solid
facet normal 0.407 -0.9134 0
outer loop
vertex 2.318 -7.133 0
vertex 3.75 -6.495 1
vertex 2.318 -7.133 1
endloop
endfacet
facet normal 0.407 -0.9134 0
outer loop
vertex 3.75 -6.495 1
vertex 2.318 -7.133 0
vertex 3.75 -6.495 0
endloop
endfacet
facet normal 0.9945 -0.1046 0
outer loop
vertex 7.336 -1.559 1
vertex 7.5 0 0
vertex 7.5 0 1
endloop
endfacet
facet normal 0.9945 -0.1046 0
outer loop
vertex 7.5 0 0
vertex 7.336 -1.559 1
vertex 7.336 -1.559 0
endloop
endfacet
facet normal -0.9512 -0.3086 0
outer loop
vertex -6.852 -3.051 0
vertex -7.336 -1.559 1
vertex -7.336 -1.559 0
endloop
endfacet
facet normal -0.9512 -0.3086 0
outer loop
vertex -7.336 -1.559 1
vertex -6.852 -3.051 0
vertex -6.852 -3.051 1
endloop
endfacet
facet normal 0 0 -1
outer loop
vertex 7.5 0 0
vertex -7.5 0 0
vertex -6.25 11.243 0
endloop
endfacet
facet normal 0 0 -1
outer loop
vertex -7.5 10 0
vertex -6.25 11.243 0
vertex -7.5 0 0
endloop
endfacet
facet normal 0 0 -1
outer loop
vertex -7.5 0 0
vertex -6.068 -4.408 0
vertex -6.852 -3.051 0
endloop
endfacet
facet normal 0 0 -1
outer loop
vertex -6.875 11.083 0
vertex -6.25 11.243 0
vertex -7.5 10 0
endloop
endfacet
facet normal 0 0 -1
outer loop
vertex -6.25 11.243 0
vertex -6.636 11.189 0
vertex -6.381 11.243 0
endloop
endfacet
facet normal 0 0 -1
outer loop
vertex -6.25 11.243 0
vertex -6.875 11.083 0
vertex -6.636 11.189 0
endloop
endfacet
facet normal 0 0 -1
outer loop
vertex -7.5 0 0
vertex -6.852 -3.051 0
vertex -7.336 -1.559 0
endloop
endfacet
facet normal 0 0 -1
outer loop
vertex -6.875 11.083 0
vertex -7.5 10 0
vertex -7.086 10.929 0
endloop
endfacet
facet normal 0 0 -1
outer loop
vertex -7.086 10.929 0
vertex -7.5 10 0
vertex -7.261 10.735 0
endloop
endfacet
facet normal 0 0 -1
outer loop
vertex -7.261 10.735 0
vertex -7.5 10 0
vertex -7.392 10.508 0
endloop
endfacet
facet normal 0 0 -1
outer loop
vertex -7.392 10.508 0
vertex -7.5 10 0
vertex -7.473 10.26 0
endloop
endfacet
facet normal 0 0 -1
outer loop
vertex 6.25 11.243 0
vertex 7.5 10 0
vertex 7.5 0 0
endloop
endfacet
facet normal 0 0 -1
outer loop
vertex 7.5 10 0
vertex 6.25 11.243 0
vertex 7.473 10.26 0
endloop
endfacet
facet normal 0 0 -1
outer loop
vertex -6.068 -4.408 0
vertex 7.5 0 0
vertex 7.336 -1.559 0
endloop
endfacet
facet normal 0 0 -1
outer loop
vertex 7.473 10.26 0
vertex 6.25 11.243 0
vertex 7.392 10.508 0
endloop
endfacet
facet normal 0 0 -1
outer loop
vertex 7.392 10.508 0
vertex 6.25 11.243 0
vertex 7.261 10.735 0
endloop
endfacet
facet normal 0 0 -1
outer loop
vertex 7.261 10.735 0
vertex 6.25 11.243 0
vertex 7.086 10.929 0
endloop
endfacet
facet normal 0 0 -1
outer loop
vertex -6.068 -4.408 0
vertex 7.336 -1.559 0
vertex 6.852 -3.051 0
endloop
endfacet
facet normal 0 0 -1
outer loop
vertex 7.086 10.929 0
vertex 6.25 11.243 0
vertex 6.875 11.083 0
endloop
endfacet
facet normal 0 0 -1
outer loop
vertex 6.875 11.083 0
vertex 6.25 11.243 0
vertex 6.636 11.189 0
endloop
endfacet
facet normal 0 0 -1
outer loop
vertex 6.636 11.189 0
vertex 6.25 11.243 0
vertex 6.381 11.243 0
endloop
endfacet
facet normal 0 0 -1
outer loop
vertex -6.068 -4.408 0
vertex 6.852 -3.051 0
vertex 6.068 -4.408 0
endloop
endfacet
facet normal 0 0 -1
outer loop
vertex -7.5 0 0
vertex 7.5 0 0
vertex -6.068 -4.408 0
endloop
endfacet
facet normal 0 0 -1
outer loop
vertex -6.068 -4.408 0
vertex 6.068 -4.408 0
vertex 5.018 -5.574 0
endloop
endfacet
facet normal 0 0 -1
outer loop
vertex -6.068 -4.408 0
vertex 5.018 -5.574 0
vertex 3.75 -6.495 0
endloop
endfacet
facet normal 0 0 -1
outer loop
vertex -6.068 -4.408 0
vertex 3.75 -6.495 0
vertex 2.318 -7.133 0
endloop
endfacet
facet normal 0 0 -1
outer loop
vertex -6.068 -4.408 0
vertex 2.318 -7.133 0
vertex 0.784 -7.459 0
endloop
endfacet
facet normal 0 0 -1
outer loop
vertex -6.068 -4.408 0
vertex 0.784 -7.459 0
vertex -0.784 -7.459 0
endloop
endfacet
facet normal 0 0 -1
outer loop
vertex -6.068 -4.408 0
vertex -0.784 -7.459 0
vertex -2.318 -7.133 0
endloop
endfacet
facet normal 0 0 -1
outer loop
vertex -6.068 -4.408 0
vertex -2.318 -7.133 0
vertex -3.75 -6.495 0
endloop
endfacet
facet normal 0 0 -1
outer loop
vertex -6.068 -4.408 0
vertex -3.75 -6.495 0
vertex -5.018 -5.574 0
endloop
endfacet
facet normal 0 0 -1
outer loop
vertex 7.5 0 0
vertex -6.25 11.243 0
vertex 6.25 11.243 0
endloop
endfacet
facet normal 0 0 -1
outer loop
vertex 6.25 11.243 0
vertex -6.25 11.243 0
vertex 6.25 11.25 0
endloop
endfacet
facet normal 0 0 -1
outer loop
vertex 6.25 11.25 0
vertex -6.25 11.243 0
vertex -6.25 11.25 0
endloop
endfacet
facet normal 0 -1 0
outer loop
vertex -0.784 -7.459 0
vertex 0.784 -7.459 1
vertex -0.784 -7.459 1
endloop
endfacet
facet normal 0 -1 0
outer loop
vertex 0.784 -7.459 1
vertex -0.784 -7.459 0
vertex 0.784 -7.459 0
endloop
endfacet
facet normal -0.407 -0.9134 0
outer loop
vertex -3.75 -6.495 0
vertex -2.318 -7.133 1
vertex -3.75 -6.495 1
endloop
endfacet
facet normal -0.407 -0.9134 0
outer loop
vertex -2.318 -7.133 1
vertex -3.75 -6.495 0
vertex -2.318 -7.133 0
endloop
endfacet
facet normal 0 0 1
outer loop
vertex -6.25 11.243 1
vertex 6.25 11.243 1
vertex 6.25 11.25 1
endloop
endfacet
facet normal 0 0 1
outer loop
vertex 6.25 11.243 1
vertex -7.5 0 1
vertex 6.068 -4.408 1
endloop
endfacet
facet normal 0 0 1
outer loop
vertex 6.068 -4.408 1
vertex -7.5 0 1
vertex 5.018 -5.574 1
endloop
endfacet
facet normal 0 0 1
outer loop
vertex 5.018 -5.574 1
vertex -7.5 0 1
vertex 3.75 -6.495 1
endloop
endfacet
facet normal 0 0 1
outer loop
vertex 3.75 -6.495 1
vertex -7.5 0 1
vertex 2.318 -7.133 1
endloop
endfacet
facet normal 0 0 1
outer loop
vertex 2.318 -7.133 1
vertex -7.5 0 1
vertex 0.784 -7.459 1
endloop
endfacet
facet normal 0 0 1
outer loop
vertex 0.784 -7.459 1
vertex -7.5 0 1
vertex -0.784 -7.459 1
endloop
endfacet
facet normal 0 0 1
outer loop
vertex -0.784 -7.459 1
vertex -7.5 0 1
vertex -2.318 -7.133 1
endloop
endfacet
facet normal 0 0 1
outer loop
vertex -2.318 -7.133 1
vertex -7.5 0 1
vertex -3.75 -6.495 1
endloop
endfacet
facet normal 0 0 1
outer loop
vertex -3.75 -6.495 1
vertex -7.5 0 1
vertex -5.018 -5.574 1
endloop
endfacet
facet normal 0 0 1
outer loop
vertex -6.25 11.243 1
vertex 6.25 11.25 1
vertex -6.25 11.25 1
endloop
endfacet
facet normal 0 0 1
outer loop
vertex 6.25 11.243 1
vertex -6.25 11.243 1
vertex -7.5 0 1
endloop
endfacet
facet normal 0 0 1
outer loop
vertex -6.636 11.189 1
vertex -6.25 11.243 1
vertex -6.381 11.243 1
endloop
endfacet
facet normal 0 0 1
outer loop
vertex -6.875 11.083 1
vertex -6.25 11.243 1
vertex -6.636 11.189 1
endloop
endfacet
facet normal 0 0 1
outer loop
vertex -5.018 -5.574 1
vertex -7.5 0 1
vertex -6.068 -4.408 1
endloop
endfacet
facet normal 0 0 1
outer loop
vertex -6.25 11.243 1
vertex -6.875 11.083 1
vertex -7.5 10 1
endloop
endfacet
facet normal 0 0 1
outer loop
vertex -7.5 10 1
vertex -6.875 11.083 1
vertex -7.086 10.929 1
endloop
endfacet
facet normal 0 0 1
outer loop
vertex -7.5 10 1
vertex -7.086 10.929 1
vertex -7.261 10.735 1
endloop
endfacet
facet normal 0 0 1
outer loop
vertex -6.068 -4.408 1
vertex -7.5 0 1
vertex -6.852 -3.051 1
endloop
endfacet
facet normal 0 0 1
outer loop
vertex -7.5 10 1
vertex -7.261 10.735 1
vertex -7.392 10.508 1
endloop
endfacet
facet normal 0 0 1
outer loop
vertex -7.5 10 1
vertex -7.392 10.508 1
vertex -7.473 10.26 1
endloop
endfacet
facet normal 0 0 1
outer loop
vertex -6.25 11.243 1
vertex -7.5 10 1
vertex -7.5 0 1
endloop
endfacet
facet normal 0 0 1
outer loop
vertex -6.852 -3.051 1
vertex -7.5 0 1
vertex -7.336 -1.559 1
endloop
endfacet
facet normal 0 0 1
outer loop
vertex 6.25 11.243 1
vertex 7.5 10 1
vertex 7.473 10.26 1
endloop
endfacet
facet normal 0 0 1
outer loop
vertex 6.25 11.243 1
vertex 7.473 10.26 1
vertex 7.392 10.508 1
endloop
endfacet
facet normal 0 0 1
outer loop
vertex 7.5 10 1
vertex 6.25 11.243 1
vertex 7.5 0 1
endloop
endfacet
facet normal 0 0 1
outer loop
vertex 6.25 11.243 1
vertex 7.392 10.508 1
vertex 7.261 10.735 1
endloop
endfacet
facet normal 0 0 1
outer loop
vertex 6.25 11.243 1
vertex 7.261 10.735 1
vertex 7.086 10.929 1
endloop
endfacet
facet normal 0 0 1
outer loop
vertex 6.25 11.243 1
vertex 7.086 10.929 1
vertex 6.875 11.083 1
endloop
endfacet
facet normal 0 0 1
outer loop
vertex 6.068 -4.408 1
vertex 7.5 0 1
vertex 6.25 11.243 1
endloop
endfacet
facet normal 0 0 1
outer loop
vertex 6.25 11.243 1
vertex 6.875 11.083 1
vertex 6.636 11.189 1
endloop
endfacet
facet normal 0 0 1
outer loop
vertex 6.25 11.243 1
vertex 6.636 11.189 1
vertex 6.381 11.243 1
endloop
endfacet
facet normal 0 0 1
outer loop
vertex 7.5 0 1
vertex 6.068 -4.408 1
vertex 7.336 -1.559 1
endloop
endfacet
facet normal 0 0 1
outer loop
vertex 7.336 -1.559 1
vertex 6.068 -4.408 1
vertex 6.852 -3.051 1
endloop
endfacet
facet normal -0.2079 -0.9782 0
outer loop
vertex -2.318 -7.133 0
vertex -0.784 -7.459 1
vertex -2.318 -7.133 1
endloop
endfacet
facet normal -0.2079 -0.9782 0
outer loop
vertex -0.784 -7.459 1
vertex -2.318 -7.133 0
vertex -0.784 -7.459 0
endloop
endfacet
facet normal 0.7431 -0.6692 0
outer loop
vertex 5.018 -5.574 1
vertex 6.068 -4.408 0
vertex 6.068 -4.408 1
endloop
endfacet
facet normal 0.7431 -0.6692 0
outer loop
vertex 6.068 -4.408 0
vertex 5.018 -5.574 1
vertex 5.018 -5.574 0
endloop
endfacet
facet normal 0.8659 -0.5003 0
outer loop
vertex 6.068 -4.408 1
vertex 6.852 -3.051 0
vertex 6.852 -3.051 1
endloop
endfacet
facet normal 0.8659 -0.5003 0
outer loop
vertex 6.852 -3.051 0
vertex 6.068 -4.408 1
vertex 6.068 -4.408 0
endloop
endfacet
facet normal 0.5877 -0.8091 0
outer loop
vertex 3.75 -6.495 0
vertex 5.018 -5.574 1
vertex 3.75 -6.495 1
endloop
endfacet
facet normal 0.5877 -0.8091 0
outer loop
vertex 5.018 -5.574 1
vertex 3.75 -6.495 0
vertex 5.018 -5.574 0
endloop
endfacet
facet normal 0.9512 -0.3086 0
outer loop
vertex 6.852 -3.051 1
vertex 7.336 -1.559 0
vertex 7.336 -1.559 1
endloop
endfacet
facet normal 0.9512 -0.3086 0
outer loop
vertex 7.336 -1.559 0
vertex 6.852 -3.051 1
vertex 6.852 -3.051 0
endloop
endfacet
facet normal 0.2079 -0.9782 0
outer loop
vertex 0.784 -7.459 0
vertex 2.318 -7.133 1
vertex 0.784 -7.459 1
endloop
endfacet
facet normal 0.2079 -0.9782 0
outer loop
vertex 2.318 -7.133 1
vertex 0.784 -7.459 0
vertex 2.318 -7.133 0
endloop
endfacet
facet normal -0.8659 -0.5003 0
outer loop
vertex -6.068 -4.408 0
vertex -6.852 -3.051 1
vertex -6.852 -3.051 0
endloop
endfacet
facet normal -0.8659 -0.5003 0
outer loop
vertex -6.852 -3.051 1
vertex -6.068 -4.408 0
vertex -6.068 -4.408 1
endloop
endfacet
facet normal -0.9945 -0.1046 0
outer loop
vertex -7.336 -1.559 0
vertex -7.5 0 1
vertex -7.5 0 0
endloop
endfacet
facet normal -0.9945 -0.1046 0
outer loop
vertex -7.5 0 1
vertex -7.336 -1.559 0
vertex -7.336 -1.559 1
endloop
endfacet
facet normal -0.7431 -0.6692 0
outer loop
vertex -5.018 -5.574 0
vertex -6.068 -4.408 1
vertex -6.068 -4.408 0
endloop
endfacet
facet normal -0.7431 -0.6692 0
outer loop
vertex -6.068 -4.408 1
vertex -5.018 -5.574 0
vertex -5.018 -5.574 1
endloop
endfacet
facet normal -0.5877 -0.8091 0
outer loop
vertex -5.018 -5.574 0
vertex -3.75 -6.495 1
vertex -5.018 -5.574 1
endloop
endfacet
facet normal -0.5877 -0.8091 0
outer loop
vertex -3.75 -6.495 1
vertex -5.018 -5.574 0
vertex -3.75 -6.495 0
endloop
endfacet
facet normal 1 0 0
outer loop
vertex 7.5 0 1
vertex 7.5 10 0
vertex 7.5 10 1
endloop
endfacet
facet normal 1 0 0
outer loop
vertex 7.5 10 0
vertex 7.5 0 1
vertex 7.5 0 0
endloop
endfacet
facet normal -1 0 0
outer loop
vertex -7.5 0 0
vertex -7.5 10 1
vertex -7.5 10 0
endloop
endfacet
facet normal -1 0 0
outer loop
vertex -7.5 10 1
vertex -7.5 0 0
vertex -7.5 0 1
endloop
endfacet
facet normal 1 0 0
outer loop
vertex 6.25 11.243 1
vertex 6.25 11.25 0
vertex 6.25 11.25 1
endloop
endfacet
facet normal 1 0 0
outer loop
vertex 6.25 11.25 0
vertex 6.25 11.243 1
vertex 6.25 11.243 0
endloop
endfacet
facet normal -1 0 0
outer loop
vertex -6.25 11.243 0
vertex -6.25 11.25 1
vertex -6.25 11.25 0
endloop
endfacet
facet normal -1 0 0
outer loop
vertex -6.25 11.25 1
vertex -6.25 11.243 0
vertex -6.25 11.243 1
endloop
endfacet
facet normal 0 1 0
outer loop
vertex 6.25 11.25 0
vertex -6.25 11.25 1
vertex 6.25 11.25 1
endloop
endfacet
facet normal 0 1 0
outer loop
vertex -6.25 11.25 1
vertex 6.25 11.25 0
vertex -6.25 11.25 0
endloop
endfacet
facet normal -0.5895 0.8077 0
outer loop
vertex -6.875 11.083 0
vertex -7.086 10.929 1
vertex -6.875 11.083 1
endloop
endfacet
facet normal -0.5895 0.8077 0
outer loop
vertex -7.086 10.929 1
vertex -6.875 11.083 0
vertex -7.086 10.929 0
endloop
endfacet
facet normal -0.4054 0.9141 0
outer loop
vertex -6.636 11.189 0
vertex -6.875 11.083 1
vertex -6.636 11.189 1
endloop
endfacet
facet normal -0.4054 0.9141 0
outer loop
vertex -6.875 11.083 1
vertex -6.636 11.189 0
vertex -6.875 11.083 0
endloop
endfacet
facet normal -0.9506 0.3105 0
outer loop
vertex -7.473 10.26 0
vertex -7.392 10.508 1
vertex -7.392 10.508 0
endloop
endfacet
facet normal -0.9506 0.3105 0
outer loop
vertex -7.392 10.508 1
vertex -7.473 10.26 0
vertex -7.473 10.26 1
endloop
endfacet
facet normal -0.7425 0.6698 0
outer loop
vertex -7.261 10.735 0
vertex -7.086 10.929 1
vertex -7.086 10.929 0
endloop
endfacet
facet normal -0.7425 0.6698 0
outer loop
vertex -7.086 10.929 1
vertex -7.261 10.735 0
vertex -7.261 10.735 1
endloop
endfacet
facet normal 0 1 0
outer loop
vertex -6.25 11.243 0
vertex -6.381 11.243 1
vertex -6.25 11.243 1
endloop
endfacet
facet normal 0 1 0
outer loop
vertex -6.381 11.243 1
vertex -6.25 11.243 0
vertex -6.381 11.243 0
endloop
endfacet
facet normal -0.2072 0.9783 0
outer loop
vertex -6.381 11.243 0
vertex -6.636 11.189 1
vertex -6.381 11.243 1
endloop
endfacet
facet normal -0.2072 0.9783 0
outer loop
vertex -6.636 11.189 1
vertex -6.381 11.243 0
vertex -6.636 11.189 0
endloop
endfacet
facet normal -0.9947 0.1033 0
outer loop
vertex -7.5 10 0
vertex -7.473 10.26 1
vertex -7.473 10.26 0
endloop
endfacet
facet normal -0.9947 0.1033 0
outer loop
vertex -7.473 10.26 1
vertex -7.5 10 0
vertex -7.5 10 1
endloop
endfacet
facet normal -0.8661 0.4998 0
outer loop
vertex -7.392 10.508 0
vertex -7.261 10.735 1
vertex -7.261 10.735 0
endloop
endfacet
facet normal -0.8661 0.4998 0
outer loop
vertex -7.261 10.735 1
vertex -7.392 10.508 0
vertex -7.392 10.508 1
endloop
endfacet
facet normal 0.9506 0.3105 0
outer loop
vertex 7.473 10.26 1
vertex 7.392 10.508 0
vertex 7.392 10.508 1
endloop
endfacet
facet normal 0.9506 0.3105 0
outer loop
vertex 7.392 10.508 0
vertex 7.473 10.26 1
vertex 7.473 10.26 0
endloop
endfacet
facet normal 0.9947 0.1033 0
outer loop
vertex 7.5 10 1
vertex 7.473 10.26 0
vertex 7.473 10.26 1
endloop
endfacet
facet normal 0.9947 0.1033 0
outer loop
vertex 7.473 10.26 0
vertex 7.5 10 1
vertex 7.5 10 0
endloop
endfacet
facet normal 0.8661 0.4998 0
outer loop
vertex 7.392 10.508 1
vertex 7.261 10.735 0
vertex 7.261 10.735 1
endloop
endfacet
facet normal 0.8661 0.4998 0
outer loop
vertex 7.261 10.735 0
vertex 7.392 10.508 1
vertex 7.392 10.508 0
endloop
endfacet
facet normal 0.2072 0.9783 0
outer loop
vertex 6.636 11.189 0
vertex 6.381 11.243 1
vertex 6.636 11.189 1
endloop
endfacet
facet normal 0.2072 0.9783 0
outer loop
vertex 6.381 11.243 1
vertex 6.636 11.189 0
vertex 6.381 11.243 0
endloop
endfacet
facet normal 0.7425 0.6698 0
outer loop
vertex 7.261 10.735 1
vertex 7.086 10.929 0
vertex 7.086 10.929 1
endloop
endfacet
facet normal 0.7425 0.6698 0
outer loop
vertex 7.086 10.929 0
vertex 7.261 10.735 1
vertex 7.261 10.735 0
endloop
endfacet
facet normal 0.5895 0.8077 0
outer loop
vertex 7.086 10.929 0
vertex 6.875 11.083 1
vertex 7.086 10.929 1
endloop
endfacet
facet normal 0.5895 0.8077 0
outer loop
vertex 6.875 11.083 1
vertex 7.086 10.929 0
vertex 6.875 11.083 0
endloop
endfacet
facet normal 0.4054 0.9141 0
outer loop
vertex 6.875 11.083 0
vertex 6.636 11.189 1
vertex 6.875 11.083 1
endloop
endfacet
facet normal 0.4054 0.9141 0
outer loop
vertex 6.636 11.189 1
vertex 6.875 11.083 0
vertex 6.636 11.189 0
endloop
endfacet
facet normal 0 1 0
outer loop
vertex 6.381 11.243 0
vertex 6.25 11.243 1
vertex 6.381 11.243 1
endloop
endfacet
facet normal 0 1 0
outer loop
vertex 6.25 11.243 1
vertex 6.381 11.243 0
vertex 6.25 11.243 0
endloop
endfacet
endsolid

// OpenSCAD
// [FL_INDEX: keywords="openscad, 3d_parametric, Customizable_Kickboard_Paperweight, csg_solid" | COT="Parametric OpenSCAD design from 3DCodeverse"]
// Title: Customizable Kickboard Paperweight

length=17.5; //[8:35]
width=15; //[5:30]
thickness=1; //[1:4]
difference()
{
union()
{
scale(0.1) cylinder(r=width*5,h=thickness*10);
translate([width/-2,0,0]) scale([width,length-(width/2),thickness]) cube(1);
translate([(width/-2)+1.25,length-(width/2),0]) scale([width-2.5,1.25,thickness]) cube(1);
translate([(width/-2)+1.25,length-(width/2),0]) scale(0.1) cylinder(r=12.5,h=thickness*10);
translate([(width/2)-1.25,length-(width/2),0]) scale(0.1) cylinder(r=12.5,h=thickness*10);
}
}
